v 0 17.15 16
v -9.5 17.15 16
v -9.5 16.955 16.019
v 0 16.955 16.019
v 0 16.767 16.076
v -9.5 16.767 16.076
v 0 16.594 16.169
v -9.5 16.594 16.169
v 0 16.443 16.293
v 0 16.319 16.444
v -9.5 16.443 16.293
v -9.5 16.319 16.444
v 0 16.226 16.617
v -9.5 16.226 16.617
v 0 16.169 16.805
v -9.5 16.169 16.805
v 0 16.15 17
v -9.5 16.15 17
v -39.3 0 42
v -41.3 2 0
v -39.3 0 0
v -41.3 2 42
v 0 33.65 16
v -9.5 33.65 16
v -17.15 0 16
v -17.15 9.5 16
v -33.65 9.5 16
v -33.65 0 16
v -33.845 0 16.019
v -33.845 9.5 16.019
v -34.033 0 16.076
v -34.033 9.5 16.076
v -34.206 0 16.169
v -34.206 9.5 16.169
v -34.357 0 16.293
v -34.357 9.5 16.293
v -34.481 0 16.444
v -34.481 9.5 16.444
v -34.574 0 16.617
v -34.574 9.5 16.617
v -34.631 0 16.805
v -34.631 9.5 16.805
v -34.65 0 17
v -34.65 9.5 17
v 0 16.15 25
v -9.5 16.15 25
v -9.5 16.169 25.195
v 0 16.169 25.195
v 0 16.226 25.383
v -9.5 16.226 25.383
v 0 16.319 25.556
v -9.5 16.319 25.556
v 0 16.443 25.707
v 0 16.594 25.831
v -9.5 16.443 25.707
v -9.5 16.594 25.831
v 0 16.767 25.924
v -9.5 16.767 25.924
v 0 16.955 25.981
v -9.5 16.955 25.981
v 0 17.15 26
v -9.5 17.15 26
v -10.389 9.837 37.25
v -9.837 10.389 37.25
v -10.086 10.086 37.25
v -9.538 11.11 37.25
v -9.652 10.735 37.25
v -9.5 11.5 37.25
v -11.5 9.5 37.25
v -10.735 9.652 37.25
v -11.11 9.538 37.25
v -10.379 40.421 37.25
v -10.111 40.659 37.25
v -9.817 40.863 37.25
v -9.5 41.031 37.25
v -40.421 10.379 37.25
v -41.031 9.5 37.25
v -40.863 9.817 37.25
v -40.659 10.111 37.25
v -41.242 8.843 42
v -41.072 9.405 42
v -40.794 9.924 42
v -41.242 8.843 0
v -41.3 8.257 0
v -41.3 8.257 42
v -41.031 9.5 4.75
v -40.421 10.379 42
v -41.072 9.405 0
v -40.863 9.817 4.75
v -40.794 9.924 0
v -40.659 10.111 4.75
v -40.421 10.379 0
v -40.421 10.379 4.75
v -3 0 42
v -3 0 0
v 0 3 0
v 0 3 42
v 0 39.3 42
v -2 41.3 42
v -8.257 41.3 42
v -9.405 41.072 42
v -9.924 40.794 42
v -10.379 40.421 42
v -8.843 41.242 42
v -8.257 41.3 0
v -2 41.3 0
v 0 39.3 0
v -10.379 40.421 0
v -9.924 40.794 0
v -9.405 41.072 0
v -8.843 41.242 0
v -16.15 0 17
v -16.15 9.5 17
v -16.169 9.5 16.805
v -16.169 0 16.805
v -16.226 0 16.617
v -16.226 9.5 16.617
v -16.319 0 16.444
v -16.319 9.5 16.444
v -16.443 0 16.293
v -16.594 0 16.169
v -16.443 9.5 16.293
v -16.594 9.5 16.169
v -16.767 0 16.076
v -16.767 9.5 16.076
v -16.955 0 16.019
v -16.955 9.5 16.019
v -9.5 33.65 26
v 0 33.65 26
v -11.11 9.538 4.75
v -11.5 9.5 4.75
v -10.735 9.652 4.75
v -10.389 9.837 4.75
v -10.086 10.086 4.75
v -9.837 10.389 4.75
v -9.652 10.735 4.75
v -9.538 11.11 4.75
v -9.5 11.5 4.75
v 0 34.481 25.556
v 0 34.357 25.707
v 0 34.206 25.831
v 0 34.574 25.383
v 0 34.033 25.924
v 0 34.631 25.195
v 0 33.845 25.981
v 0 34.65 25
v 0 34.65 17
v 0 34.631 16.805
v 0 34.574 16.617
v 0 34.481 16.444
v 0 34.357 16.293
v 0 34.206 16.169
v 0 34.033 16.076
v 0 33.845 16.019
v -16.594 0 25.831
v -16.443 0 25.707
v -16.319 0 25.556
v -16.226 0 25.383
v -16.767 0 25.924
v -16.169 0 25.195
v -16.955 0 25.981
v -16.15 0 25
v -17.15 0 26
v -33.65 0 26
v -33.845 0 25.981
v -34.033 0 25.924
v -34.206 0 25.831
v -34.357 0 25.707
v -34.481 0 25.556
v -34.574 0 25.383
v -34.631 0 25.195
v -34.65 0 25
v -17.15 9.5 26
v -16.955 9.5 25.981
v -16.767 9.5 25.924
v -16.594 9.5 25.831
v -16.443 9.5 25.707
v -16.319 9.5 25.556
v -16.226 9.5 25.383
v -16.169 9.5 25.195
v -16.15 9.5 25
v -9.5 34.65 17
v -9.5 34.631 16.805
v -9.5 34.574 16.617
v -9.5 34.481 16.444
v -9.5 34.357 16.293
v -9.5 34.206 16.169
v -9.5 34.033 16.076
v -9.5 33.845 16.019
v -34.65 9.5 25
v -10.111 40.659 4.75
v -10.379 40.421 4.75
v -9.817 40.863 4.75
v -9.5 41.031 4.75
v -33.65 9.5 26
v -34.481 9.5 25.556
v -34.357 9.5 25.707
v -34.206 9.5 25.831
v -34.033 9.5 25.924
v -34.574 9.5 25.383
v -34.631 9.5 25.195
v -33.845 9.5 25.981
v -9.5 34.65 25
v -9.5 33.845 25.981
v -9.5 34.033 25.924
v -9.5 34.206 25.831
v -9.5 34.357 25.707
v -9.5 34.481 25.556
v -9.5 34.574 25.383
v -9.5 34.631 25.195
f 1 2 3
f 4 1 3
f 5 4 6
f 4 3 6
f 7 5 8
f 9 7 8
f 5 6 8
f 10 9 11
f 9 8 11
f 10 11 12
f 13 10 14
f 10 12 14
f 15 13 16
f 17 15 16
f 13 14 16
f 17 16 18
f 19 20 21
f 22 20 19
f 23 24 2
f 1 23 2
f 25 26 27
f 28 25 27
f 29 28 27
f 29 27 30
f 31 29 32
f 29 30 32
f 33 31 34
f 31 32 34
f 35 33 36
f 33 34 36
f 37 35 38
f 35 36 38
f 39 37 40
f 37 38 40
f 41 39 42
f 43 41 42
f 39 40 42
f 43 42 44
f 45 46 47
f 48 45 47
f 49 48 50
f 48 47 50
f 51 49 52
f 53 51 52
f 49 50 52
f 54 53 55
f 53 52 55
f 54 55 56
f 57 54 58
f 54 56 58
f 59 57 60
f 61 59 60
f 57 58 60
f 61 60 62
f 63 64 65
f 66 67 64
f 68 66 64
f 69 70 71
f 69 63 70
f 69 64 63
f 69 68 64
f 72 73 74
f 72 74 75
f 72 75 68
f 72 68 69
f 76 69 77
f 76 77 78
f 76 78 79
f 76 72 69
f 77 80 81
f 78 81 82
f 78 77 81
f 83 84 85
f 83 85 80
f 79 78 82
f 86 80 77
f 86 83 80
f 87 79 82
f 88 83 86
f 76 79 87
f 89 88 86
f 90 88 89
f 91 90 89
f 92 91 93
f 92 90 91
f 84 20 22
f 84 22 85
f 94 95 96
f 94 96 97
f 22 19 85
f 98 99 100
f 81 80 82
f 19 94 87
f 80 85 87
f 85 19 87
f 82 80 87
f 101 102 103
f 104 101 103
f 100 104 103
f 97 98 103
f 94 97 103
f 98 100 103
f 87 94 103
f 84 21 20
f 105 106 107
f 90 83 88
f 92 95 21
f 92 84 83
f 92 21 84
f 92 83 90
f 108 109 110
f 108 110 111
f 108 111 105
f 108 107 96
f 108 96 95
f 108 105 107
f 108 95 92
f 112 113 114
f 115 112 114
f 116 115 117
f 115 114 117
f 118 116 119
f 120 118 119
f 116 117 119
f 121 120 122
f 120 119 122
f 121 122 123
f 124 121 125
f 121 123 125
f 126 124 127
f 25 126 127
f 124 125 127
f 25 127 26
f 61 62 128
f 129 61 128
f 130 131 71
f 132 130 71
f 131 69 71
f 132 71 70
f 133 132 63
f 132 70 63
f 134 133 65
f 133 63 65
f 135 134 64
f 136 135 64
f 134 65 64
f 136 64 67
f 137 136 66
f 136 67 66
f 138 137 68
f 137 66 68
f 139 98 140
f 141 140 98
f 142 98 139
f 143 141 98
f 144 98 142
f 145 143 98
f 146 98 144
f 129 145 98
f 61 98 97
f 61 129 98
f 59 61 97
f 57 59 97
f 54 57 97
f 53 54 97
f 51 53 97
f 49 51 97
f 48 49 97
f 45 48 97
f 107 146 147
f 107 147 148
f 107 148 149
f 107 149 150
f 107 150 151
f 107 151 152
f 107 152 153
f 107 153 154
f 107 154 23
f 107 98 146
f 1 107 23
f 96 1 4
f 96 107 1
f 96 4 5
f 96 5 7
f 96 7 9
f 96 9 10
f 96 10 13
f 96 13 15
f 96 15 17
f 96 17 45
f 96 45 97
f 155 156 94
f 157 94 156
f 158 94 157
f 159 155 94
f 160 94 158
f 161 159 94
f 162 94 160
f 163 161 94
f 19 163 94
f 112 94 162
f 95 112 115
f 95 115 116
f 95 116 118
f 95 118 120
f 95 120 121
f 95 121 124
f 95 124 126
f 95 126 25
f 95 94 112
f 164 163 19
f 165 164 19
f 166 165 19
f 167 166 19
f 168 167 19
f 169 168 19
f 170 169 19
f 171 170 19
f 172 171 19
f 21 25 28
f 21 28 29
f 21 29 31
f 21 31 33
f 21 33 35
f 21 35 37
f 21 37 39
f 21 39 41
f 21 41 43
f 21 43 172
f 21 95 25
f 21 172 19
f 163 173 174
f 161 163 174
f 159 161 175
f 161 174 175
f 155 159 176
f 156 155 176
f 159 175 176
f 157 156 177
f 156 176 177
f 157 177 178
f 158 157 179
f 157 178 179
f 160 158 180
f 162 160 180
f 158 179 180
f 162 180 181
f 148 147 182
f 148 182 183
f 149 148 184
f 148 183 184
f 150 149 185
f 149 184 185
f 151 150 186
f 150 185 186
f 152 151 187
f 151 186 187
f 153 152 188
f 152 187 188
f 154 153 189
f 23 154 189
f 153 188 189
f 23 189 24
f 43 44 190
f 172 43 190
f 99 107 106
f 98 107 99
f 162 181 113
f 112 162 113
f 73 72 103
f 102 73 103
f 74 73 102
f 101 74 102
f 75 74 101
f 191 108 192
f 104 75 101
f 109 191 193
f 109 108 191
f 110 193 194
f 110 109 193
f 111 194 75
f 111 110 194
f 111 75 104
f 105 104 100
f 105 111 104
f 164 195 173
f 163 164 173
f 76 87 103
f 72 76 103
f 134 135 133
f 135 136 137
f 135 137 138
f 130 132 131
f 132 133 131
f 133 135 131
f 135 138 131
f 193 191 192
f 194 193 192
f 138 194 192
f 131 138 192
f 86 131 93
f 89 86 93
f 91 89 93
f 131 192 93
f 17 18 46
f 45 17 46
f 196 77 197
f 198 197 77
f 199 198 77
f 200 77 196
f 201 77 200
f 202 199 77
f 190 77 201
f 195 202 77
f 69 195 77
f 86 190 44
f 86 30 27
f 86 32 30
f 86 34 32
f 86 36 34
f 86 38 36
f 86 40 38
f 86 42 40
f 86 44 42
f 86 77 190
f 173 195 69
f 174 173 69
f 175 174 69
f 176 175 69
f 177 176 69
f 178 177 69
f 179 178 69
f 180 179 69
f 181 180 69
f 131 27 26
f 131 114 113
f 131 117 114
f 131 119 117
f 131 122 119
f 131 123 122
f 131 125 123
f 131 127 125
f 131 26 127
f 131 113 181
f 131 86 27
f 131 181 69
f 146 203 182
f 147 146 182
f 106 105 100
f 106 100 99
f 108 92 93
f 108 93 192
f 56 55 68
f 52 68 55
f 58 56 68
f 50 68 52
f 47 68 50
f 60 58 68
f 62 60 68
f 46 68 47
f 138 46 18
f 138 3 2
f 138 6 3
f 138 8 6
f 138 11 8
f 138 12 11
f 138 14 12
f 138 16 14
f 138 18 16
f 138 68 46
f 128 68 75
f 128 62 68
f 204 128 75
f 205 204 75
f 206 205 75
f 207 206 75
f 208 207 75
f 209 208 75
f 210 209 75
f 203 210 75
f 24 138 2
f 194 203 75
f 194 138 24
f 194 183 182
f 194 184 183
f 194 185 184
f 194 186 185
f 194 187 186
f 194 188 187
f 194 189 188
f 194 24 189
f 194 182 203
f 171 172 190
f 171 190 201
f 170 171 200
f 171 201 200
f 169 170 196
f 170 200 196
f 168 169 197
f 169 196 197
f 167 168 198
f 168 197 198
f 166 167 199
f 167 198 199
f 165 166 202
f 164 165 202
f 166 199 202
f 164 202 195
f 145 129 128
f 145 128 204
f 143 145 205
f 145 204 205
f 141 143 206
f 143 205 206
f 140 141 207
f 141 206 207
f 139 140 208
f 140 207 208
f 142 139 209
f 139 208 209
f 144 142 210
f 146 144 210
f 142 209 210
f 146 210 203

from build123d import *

# Parameters (mm, degrees)
BOSS_EXTRUDE1_DEPTH = 42
BOSS_EXTRUDE2_DEPTH = 4.75
CUT_EXTRUDE1_DEPTH  = 9.5
CUT_EXTRUDE2_DEPTH  = 9.5
FILLET6_R           = 2
FILLET7_START       = -1
FILLET7_DEPTH       = 44
FILLET8_START       = -1
FILLET8_DEPTH       = 44
CHAMFER1_SIZE       = 2
CHAMFER2_SIZE       = 3
CHAMFER3_SIZE       = 2


with BuildPart() as part:
    # Sketch1 → Boss-Extrude1 (new body)
    with BuildSketch(Plane.XY):
        Polygon((0, 0), (-41.3, 0), (-41.3, 9.5), (-9.5, 9.5), (-9.5, 41.3), (0, 41.3), align=None)
    extrude(amount=BOSS_EXTRUDE1_DEPTH)

    # Sketch2 → Boss-Extrude2 (add)
    with BuildSketch(Plane.XY.offset(42)):
        Polygon((-41.3, 9.5), (-9.5, 41.3), (-9.5, 9.5), align=None)
    boss_extrude2 = extrude(amount=-BOSS_EXTRUDE2_DEPTH)

    # Mirror1: Boss-Extrude2 across plane
    add(boss_extrude2.mirror(Plane.XY.offset(21)))

    # Sketch3 → Cut-Extrude1 (cut)
    with BuildSketch(Plane.ZY.offset(9.5)):
        with BuildLine():
            Line((17, 16.15), (25, 16.15))
            ThreePointArc((25, 16.15), (25.707106781, 16.442893219), (26, 17.15))
            Line((26, 17.15), (26, 33.65))
            ThreePointArc((26, 33.65), (25.707106781, 34.357106781), (25, 34.65))
            Line((25, 34.65), (17, 34.65))
            ThreePointArc((17, 34.65), (16.292893219, 34.357106781), (16, 33.65))
            Line((16, 33.65), (16, 17.15))
            ThreePointArc((16, 17.15), (16.292893219, 16.442893219), (17, 16.15))
        make_face()
    extrude(amount=-CUT_EXTRUDE1_DEPTH, mode=Mode.SUBTRACT)

    # Sketch4 → Cut-Extrude2 (cut)
    with BuildSketch(Plane(origin=(0, 9.5, 0), x_dir=(1, 0, 0), z_dir=(0, 1, 0))):
        with BuildLine():
            Line((-33.65, -26), (-17.15, -26))
            ThreePointArc((-17.15, -26), (-16.442893219, -25.707106781), (-16.15, -25))
            Line((-16.15, -25), (-16.15, -17))
            ThreePointArc((-16.15, -17), (-16.442893219, -16.292893219), (-17.15, -16))
            Line((-17.15, -16), (-33.65, -16))
            ThreePointArc((-33.65, -16), (-34.357106781, -16.292893219), (-34.65, -17))
            Line((-34.65, -17), (-34.65, -25))
            ThreePointArc((-34.65, -25), (-34.357106781, -25.707106781), (-33.65, -26))
        make_face()
    extrude(amount=-CUT_EXTRUDE2_DEPTH, mode=Mode.SUBTRACT)

    # Fillet6
    fillet6_edges = [part.edges().sort_by_distance(p)[0] for p in [
        (-9.5, 9.5, 21),
    ]]
    fillet(fillet6_edges, radius=FILLET6_R)

    # Fillet7: read off the stored shape, not the designer's step
    # Fillet7 outline → Fillet7 (cut)
    with BuildSketch(Plane.XY.offset(FILLET7_START)):
        with BuildLine():
            Line((-9.5, 41.3), (-10.378679656, 40.421320344))
            ThreePointArc((-10.378679656, 40.421320344), (-9.40540961, 41.071638598), (-8.257359313, 41.3))
            Line((-8.257359313, 41.3), (-9.5, 41.3))
        make_face()
    extrude(amount=FILLET7_DEPTH, mode=Mode.SUBTRACT)

    # Fillet8: read off the stored shape, not the designer's step
    # Fillet8 outline → Fillet8 (cut)
    with BuildSketch(Plane.XY.offset(FILLET8_START)):
        with BuildLine():
            Line((-40.421320344, 10.378679656), (-41.3, 9.5))
            Line((-41.3, 9.5), (-41.3, 8.257359313))
            ThreePointArc((-41.3, 8.257359313), (-41.071638598, 9.40540961), (-40.421320344, 10.378679656))
        make_face()
    extrude(amount=FILLET8_DEPTH, mode=Mode.SUBTRACT)

    # Chamfer1
    chamfer1_edges = [part.edges().sort_by_distance(p)[0] for p in [
        (0, 41.3, 21),
    ]]
    chamfer(chamfer1_edges, length=CHAMFER1_SIZE)

    # Chamfer2
    chamfer2_edges = [part.edges().sort_by_distance(p)[0] for p in [
        (0, 0, 21),
    ]]
    chamfer(chamfer2_edges, length=CHAMFER2_SIZE)

    # Chamfer3
    chamfer3_edges = [part.edges().sort_by_distance(p)[0] for p in [
        (-41.3, 0, 21),
    ]]
    chamfer(chamfer3_edges, length=CHAMFER3_SIZE)


solid = part.part
